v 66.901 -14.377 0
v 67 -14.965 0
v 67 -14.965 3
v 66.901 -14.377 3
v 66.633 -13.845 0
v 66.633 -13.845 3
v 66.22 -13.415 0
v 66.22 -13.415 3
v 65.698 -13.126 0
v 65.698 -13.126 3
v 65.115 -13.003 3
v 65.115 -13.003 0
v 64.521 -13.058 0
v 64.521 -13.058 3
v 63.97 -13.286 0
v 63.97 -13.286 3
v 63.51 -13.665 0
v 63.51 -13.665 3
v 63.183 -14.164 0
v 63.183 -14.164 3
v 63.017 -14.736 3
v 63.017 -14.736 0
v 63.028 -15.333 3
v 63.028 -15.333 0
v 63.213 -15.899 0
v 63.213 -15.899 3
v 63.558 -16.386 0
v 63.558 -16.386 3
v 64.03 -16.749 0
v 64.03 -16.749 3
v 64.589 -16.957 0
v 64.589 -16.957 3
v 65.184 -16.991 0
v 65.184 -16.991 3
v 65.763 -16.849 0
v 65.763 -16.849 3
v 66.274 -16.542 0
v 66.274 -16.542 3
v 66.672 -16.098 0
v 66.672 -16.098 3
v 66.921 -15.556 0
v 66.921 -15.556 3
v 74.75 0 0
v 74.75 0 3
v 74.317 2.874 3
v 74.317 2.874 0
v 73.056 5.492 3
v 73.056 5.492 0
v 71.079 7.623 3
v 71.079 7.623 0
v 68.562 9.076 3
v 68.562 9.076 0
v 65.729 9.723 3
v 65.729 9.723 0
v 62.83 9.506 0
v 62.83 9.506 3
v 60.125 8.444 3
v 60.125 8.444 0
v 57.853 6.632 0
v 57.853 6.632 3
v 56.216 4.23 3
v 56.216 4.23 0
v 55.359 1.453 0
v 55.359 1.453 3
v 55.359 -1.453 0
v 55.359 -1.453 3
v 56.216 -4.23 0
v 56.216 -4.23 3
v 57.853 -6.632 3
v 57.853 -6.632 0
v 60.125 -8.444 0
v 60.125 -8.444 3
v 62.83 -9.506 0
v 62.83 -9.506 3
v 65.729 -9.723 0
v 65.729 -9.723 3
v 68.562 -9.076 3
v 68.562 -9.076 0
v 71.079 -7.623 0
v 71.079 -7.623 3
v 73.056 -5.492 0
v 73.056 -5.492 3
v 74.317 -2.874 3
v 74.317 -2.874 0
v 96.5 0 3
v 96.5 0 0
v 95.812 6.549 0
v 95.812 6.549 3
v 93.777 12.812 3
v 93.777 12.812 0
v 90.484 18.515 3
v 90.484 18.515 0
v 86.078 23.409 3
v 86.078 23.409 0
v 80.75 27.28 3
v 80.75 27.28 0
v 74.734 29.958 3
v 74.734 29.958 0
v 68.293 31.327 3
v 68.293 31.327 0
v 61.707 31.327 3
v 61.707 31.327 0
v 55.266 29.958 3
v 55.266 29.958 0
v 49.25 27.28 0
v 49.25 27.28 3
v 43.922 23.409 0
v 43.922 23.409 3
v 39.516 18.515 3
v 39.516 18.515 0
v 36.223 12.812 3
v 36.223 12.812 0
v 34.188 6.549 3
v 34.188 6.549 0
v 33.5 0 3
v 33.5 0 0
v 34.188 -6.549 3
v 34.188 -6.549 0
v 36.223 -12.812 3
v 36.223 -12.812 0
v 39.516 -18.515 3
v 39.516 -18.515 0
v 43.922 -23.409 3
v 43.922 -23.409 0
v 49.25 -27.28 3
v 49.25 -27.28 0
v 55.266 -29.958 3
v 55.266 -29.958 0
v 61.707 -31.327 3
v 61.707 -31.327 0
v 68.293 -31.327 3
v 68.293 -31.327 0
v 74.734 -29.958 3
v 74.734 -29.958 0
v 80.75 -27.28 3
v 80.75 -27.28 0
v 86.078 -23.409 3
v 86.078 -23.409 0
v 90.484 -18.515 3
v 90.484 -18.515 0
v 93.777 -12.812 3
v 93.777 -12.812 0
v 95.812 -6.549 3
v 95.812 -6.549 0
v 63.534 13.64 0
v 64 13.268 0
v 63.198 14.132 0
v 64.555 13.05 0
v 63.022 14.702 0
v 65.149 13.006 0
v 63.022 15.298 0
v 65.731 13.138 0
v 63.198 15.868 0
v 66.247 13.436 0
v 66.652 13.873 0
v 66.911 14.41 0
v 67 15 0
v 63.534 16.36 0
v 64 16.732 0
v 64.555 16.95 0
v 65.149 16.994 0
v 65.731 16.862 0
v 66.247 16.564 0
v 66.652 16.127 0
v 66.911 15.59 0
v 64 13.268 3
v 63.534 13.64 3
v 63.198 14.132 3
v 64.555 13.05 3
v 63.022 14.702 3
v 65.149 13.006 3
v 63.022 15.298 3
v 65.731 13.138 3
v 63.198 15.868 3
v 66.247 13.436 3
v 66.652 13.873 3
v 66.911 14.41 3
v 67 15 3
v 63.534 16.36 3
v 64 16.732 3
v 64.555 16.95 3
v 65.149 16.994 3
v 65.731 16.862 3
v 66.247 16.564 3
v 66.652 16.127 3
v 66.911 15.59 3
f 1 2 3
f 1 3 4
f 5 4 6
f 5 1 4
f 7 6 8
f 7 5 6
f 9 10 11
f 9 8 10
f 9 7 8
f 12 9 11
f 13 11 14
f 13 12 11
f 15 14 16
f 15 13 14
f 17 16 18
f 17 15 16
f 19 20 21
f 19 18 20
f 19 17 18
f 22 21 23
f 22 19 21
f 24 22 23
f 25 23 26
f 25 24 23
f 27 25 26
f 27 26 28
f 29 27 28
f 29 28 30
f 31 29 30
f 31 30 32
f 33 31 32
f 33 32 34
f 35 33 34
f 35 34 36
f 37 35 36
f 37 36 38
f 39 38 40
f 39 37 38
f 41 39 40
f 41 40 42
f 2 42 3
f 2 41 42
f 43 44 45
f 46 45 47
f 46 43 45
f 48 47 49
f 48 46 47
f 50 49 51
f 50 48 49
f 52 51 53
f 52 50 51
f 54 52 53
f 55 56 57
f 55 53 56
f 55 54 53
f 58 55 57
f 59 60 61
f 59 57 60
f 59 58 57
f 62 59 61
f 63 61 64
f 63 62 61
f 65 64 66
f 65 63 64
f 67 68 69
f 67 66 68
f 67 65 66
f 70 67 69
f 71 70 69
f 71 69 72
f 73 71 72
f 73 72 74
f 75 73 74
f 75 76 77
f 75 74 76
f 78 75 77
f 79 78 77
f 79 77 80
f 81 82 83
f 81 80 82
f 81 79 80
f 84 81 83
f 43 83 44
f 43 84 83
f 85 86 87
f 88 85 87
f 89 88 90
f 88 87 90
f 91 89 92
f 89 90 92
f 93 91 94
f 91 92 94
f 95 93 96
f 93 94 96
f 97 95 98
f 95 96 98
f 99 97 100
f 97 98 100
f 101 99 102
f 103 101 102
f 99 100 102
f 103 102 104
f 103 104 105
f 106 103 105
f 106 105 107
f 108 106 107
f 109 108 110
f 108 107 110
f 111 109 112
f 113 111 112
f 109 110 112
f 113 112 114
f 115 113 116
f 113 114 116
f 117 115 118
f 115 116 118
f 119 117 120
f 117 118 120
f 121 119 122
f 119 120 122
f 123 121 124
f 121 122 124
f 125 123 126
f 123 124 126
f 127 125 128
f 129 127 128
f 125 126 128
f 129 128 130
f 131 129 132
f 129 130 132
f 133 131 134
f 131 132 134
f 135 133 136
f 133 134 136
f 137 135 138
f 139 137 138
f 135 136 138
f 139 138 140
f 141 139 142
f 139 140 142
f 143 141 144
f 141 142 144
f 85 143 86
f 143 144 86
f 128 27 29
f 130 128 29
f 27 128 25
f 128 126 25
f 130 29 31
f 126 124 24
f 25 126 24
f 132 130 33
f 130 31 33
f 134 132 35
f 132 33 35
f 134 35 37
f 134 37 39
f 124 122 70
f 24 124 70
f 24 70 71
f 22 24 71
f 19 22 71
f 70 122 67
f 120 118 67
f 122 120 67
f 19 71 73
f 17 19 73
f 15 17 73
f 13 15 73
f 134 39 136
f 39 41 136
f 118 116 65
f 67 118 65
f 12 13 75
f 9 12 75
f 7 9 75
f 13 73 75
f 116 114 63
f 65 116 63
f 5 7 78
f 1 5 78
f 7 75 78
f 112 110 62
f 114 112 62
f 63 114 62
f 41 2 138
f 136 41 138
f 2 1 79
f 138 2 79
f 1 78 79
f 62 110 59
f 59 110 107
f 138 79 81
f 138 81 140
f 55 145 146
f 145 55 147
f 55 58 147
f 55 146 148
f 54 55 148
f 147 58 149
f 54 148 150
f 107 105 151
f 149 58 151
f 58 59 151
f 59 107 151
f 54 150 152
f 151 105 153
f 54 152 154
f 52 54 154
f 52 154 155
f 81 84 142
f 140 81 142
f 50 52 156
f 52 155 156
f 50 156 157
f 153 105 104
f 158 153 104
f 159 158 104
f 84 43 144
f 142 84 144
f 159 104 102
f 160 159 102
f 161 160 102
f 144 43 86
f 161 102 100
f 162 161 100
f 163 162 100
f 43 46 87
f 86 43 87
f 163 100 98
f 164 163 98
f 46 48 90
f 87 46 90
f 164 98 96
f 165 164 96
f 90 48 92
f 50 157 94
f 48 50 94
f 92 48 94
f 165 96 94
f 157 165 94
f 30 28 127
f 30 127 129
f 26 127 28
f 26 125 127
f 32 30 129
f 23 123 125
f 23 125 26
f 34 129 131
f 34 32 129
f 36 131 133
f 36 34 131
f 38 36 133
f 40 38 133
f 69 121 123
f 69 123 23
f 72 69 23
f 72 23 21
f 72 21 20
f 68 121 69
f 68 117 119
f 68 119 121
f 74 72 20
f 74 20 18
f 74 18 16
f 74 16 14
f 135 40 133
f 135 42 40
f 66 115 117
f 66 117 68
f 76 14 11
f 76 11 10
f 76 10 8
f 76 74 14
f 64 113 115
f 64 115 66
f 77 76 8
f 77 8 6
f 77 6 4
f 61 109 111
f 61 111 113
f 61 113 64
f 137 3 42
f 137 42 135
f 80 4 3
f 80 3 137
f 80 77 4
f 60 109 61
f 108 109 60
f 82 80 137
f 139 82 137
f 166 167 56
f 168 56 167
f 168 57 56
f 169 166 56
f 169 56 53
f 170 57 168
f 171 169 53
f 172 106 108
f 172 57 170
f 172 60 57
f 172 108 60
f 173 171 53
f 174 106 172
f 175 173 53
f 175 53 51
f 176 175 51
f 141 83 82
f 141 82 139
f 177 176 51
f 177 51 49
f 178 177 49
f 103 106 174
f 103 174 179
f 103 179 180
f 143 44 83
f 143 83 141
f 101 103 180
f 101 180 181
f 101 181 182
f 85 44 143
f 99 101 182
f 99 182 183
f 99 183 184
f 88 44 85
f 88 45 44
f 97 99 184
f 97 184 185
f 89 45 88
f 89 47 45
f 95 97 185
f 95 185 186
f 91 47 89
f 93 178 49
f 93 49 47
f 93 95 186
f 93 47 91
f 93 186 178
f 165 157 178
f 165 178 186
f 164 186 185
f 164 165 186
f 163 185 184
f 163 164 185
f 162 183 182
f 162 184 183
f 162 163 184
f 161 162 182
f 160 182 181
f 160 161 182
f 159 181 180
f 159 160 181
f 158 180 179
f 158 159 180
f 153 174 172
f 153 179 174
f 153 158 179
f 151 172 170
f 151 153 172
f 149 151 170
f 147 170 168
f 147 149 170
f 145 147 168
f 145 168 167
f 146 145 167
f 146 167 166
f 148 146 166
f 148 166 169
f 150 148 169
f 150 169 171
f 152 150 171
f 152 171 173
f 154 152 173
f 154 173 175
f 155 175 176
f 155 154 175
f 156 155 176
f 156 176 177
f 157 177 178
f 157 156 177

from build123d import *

# Parameters (mm, degrees)
CYLINDER012_R               = 2
CYLINDER012_DEPTH           = 15
CYLINDER012_PLACEMENT_ANGLE = 1
CYLINDER013_R               = 2
CYLINDER013_DEPTH           = 15
CYLINDER006_R               = 9.75
CYLINDER006_DEPTH           = 6
CYLINDER004_R               = 31.5
CYLINDER004_DEPTH           = 3


with BuildPart() as cylinder012:
    # Cylinder012 → Cylinder012 (new body)
    with BuildSketch(Plane.XY):
        Circle(CYLINDER012_R)
    extrude(amount=CYLINDER012_DEPTH)


with BuildPart() as cylinder012_1:
    # Cylinder012 placement: moved
    add(cylinder012.part.moved(Location((0, -15, -1))).rotate(Axis((0, -15, -1), (0, 0, 1)), CYLINDER012_PLACEMENT_ANGLE))


with BuildPart() as fusion004:
    # Cylinder013 → Cylinder013 (new body)
    with BuildSketch(Plane(origin=(0, 15, -1), x_dir=(1, 0, 0), z_dir=(0, 0, 1))):
        Circle(CYLINDER013_R)
    extrude(amount=CYLINDER013_DEPTH)

    # Fusion004: union Cylinder012
    add(cylinder012_1.part)


with BuildPart() as cylinder006:
    # Cylinder006 → Cylinder006 (new body)
    with BuildSketch(Plane.XY):
        Circle(CYLINDER006_R)
    extrude(amount=CYLINDER006_DEPTH)


with BuildPart() as end_flange001:
    # Cylinder004 → Cylinder004 (new body)
    with BuildSketch(Plane.XY):
        Circle(CYLINDER004_R)
    extrude(amount=CYLINDER004_DEPTH)

    # Cut001: cut Cylinder006
    add(cylinder006.part, mode=Mode.SUBTRACT)

    # Cut009: cut Fusion004
    add(fusion004.part, mode=Mode.SUBTRACT)


with BuildPart() as end_flange001_1:
    # Cut009 placement: moved
    add(end_flange001.part.moved(Location((65, 0, 0))))


solid = end_flange001_1.part
